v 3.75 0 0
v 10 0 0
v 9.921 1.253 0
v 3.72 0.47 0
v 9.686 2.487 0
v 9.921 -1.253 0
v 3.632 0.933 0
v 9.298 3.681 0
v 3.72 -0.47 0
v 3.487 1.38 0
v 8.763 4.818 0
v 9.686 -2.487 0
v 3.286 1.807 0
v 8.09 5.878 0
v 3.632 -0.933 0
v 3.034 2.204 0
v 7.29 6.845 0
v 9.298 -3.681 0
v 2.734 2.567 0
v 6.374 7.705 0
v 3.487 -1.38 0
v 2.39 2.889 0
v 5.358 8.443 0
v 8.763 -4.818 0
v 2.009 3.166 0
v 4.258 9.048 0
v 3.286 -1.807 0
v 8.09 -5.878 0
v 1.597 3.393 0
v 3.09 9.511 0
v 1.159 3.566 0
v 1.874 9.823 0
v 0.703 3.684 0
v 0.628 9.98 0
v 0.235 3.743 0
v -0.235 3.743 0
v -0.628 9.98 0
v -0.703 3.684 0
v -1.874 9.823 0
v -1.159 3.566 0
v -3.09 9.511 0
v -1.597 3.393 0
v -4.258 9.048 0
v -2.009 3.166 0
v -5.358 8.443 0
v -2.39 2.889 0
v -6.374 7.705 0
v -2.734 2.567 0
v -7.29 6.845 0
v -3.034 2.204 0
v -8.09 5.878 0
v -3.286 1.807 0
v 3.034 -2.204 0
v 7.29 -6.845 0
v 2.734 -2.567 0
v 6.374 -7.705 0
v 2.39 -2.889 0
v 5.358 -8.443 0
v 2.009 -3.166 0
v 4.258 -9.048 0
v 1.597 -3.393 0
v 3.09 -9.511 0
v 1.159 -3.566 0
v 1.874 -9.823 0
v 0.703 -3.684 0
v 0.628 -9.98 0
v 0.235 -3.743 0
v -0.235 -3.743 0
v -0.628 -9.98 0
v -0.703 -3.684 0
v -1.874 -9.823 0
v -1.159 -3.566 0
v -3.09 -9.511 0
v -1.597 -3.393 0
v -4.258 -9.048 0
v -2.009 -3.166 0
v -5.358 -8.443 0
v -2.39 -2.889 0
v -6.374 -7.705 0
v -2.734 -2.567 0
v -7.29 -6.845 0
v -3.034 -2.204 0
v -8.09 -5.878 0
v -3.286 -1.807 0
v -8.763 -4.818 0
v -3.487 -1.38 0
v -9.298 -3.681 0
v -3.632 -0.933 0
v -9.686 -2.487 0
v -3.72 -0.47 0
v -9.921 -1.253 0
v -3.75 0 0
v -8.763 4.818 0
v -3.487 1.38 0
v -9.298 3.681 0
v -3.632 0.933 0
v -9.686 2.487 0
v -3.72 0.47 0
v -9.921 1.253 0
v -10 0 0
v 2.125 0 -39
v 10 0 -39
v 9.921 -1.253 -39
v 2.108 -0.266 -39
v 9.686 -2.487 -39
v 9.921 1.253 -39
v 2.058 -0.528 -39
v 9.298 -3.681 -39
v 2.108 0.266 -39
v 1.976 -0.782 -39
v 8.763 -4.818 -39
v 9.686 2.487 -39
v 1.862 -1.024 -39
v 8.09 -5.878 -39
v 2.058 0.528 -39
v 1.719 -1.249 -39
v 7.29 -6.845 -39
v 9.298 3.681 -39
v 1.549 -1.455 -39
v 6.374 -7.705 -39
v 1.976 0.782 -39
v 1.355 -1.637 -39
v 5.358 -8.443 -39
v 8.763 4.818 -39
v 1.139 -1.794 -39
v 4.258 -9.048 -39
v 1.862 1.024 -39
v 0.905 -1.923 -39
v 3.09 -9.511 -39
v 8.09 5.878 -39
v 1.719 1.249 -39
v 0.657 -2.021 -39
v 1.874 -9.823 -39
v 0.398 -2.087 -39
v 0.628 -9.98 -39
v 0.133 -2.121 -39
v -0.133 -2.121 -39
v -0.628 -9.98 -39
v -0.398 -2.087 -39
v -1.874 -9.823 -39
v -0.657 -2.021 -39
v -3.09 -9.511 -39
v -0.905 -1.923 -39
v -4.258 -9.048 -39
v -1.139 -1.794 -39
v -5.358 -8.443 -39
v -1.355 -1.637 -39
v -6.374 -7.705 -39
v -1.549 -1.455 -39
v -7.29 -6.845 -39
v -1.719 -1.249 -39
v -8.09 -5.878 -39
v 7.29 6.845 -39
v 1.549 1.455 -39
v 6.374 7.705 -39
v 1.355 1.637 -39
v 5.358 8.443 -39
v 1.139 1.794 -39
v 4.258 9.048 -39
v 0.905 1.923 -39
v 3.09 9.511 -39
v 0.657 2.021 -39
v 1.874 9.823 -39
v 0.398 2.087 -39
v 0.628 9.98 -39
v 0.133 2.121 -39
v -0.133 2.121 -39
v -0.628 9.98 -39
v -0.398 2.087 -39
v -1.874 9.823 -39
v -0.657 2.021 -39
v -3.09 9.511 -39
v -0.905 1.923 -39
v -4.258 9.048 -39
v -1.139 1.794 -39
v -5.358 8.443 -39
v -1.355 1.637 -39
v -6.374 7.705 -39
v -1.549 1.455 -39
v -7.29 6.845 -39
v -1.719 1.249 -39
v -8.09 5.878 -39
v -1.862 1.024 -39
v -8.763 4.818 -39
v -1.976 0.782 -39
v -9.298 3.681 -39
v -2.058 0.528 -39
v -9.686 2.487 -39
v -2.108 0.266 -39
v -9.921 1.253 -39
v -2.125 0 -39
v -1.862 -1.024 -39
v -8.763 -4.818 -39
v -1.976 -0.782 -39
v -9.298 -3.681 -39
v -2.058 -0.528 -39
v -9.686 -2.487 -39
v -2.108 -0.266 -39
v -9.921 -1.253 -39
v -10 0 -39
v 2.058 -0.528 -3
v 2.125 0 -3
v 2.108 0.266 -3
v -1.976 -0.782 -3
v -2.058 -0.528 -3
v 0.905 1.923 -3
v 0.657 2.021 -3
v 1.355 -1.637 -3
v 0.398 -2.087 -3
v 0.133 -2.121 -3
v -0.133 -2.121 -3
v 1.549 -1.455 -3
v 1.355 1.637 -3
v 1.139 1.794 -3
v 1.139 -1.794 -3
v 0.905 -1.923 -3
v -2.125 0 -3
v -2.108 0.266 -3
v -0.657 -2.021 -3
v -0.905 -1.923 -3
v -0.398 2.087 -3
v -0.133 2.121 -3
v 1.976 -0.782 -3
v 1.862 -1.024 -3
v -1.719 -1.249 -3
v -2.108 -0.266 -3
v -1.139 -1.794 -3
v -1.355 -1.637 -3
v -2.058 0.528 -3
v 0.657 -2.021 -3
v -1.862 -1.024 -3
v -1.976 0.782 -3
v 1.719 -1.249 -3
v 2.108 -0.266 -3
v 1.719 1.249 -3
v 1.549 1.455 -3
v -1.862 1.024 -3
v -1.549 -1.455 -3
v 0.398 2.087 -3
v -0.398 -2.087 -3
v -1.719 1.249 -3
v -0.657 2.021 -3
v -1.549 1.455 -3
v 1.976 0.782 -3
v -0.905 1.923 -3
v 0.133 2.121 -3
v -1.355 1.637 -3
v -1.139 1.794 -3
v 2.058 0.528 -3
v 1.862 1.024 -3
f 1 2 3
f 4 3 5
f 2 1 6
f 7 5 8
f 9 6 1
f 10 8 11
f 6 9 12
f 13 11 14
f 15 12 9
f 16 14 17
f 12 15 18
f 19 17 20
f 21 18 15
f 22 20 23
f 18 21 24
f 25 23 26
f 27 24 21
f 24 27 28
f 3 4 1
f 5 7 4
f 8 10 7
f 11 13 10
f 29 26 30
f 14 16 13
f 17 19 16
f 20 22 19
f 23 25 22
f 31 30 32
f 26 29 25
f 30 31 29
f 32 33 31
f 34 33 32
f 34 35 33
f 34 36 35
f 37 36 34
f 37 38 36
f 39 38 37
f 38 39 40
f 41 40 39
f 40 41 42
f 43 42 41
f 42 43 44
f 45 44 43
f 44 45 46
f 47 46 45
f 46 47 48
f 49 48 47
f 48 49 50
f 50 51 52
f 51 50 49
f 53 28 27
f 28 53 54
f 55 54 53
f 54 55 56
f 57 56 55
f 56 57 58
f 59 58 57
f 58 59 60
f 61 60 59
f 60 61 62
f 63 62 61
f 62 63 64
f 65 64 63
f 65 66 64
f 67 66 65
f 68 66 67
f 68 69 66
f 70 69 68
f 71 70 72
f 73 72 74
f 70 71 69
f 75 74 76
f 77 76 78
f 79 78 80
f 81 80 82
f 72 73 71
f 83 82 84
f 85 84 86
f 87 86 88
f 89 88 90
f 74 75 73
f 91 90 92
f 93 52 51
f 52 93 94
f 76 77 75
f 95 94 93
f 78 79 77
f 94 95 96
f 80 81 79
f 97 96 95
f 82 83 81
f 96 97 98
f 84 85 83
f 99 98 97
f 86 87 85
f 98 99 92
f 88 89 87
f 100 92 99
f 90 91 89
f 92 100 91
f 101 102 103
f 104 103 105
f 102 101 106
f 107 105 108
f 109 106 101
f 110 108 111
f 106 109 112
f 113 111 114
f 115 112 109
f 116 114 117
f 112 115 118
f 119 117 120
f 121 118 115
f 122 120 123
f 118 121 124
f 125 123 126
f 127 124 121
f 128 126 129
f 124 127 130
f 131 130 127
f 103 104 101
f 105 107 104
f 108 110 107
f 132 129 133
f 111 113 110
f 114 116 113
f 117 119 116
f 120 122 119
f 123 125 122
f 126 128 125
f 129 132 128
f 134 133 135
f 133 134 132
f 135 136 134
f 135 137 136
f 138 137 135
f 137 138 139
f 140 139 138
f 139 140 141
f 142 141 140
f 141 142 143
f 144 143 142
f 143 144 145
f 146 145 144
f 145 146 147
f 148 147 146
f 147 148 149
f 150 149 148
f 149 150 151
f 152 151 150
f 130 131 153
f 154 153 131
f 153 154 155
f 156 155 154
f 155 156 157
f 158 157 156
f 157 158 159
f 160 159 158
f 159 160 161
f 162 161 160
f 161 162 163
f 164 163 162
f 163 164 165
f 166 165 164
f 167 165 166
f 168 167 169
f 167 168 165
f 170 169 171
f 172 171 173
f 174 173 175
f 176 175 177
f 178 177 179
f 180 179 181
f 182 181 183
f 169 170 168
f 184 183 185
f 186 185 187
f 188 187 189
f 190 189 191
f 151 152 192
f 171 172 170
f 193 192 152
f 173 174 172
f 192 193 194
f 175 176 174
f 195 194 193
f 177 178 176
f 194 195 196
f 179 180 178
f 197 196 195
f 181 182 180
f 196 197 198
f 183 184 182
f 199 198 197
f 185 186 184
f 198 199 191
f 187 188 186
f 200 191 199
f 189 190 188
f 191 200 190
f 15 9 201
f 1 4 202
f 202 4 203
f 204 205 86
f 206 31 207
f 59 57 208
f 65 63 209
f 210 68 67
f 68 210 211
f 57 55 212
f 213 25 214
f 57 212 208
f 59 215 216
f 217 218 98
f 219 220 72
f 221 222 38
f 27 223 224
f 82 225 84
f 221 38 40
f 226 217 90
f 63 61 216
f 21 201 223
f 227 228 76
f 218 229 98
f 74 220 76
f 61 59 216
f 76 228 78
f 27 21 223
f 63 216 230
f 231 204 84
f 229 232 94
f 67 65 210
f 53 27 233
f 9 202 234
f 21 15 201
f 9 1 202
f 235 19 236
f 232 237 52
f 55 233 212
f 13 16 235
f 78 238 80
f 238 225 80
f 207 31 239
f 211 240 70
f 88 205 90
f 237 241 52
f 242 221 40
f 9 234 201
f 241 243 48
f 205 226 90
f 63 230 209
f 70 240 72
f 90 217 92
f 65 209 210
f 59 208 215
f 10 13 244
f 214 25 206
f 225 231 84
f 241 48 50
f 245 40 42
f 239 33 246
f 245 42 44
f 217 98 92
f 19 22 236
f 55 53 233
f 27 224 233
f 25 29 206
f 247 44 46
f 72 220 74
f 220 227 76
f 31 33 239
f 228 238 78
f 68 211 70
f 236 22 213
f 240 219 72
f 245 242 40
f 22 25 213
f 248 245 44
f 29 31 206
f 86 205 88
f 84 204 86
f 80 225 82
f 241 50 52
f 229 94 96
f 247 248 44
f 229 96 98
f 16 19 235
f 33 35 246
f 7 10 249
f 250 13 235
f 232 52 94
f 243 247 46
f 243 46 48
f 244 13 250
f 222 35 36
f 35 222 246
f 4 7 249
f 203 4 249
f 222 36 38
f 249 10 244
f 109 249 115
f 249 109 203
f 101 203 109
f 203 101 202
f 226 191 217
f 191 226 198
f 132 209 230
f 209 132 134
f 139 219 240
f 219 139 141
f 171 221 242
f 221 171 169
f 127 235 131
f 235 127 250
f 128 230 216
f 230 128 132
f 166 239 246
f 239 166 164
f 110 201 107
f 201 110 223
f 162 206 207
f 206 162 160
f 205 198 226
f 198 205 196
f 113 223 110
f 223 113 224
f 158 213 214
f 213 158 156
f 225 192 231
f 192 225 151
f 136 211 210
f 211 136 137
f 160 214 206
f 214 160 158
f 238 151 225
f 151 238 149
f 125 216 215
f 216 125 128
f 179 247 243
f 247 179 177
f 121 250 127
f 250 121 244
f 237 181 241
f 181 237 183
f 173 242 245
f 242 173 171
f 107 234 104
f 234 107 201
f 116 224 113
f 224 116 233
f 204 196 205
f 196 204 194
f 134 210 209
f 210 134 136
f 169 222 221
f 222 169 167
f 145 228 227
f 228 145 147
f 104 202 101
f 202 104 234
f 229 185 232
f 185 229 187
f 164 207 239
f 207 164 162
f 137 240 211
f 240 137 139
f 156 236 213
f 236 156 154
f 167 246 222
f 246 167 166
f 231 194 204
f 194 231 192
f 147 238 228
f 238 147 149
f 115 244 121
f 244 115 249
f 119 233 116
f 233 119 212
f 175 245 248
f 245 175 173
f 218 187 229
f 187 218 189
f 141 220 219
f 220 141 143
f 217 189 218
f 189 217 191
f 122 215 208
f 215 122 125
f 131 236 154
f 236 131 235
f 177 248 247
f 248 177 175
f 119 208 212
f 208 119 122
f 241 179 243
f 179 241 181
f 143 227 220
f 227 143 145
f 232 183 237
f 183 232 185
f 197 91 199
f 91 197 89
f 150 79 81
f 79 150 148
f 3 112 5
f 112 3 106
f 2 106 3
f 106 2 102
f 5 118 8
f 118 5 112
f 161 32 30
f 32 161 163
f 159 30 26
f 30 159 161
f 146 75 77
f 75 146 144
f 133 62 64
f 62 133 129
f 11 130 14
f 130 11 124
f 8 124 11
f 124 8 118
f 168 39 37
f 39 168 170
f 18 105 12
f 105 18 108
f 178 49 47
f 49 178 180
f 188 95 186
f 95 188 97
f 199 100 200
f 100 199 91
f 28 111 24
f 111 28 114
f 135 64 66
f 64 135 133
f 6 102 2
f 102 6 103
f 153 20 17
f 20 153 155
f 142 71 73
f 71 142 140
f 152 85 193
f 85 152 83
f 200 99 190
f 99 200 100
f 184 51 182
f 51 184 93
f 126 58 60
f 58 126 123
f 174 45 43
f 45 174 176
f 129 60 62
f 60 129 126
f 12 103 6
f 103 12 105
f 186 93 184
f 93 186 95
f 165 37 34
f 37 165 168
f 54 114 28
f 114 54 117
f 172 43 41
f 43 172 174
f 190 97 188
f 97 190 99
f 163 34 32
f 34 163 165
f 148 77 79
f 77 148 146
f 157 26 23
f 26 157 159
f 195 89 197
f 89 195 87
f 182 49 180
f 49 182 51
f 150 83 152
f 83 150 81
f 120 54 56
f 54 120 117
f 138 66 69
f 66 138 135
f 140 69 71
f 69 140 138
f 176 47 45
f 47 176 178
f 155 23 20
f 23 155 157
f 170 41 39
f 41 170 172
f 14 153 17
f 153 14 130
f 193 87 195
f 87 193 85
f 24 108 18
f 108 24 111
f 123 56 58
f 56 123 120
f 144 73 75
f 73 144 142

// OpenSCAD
$fn = 50;


difference() {
	union() {
		translate(v = [0, 0, -39.0000000000]) {
			cylinder(h = 39, r = 10.0000000000);
		}
		cylinder(h = 0, r = 19.0000000000);
	}
	union() {
		translate(v = [0, 0, 0]) {
			rotate(a = [0, 0, 0]) {
				difference() {
					union() {
						#translate(v = [0, 0, -39.0000000000]) {
							cylinder(h = 39, r = 2.0000000000);
						}
						#translate(v = [0, 0, -3]) {
							cylinder(h = 3, r = 10.0000000000, r1 = 2.1250000000, r2 = 3.7500000000);
						}
						#translate(v = [0, 0, -39.0000000000]) {
							cylinder(h = 39, r = 2.1250000000);
						}
						#translate(v = [0, 0, -39.0000000000]) {
							cylinder(h = 39, r = 2.0000000000);
						}
					}
					union();
				}
			}
		}
	}
}
